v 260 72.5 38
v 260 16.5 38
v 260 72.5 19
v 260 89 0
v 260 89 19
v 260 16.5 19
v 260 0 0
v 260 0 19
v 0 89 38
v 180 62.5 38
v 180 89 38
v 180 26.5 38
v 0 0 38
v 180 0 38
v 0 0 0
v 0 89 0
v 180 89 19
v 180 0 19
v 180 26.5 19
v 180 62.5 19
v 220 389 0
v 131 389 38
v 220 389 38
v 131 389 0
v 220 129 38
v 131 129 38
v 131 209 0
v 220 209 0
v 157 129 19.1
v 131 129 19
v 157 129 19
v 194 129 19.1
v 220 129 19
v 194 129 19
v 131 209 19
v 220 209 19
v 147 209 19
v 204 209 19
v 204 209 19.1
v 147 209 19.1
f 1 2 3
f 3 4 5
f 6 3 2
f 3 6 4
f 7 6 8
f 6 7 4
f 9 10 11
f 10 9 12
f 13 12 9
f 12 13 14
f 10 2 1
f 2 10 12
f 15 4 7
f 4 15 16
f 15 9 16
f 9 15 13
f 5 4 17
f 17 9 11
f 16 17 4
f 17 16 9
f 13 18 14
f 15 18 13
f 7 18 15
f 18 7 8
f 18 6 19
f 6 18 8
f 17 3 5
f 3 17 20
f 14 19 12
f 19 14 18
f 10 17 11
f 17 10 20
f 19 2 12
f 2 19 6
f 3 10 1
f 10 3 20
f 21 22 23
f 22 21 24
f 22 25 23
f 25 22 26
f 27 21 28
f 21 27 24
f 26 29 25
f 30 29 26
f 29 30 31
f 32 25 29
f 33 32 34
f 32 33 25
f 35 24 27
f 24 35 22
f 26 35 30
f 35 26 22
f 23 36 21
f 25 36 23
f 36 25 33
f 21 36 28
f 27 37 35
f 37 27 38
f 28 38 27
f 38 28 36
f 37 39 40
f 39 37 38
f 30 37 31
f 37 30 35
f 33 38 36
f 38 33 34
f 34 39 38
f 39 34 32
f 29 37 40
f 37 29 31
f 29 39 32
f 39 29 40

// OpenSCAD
// file: hashira_lib.scad
// HASHIRA — shared dimensions (mm)
// Tunable via -D on the command line / OpenSCAD MCP variables

post_w = 89;          // ~3.5" nominal 4x4
post_d = 89;
post_h = 1800;        // above-grade height shown
rail_w = 89;          // rail width (through post face)
rail_t = 38;          // rail thickness
rail_len = 1800;      // bay center-to-center approx
bay_cc = 1800;        // post center spacing
cap_overhang = 18;
cap_h = 28;

// rail elevations from post bottom (above grade in model)
rail_z_low = 200;
rail_z_mid = 900;
rail_z_top = 1500;

ease = 1.2;           // seasonal mortise ease
peg_d = 10;
wood_post = [0.55, 0.35, 0.18];
wood_rail = [0.42, 0.52, 0.34];
wood_peg  = [0.72, 0.62, 0.42];

module hashira_post(h=post_h, w=post_w, d=post_d) {
  color(wood_post) cube([w, d, h], center=false);
}

module hashira_cap(w=post_w, d=post_d, oh=cap_overhang, h=cap_h) {
  color([0.88, 0.85, 0.78])
  translate([-oh, -oh, 0])
    linear_extrude(height=h, scale=0.72)
      square([w + 2*oh, d + 2*oh], center=false);
}

module nuki_rail(len=rail_len, w=rail_w, t=rail_t) {
  color(wood_rail) cube([len, w, t], center=false);
}

module peg(h=post_d + 20, d=peg_d) {
  color(wood_peg) cylinder(h=h, d=d, $fn=24);
}
// main file
// Ari-kake 蟻掛け — dovetail half-lap corner
include <hashira_lib.scad>

exploded = 1;
lap_t = rail_t / 2;
tail = 36;
flare = 10;
explode_gap = 40;

module dove_male() {
  // rail A
  difference() {
    cube([240, rail_w, rail_t]);
    translate([240 - 70, -1, lap_t])
      cube([71, rail_w + 2, lap_t + 1]);
  }
  // dovetail
  translate([240 - 70, rail_w/2, lap_t])
    linear_extrude(height=lap_t)
      polygon(points=[
        [0, -tail/2],
        [70, -tail/2 - flare],
        [70,  tail/2 + flare],
        [0,  tail/2]
      ]);
}

module dove_female() {
  difference() {
    cube([240, rail_w, rail_t]);
    translate([-1, -1, -0.1])
      cube([71, rail_w + 2, lap_t + 0.1]);
    translate([0, rail_w/2, -0.1])
      linear_extrude(height=lap_t + 0.2)
        polygon(points=[
          [0, -tail/2 - 0.4],
          [70, -tail/2 - flare - 0.4],
          [70,  tail/2 + flare + 0.4],
          [0,  tail/2 + 0.4]
        ]);
  }
}

module ari_kake_assembly() {
  color(wood_rail) dove_male();
  color(wood_post)
    translate([
      exploded ? 240 + explode_gap - 70 : 240 - 70,
      exploded ? rail_w + explode_gap : 0,
      0
    ])
    rotate([0, 0, exploded ? 0 : 90])
      translate([0, 0, 0]) dove_female();
}

// better corner presentation
module ari_corner() {
  color(wood_rail) {
    // X member
    difference() {
      cube([260, rail_w, rail_t]);
      translate([260-80, -1, lap_t]) cube([81, rail_w+2, lap_t+1]);
    }
    translate([260-80, rail_w/2, lap_t])
      linear_extrude(lap_t)
        polygon([[0,-tail/2],[80,-tail/2-flare],[80,tail/2+flare],[0,tail/2]]);
  }
  color(wood_post)
  translate([260 - 80 + (exploded ? explode_gap : 0), exploded ? rail_w + explode_gap : rail_w, 0])
  rotate([0,0,90]) {
    difference() {
      cube([260, rail_w, rail_t]);
      translate([-1,-1,-0.1]) cube([81, rail_w+2, lap_t+0.1]);
      translate([0, rail_w/2, -0.1])
        linear_extrude(lap_t+0.2)
          polygon([[0,-tail/2-0.5],[80,-tail/2-flare-0.5],[80,tail/2+flare+0.5],[0,tail/2+0.5]]);
    }
  }
}

ari_corner();
